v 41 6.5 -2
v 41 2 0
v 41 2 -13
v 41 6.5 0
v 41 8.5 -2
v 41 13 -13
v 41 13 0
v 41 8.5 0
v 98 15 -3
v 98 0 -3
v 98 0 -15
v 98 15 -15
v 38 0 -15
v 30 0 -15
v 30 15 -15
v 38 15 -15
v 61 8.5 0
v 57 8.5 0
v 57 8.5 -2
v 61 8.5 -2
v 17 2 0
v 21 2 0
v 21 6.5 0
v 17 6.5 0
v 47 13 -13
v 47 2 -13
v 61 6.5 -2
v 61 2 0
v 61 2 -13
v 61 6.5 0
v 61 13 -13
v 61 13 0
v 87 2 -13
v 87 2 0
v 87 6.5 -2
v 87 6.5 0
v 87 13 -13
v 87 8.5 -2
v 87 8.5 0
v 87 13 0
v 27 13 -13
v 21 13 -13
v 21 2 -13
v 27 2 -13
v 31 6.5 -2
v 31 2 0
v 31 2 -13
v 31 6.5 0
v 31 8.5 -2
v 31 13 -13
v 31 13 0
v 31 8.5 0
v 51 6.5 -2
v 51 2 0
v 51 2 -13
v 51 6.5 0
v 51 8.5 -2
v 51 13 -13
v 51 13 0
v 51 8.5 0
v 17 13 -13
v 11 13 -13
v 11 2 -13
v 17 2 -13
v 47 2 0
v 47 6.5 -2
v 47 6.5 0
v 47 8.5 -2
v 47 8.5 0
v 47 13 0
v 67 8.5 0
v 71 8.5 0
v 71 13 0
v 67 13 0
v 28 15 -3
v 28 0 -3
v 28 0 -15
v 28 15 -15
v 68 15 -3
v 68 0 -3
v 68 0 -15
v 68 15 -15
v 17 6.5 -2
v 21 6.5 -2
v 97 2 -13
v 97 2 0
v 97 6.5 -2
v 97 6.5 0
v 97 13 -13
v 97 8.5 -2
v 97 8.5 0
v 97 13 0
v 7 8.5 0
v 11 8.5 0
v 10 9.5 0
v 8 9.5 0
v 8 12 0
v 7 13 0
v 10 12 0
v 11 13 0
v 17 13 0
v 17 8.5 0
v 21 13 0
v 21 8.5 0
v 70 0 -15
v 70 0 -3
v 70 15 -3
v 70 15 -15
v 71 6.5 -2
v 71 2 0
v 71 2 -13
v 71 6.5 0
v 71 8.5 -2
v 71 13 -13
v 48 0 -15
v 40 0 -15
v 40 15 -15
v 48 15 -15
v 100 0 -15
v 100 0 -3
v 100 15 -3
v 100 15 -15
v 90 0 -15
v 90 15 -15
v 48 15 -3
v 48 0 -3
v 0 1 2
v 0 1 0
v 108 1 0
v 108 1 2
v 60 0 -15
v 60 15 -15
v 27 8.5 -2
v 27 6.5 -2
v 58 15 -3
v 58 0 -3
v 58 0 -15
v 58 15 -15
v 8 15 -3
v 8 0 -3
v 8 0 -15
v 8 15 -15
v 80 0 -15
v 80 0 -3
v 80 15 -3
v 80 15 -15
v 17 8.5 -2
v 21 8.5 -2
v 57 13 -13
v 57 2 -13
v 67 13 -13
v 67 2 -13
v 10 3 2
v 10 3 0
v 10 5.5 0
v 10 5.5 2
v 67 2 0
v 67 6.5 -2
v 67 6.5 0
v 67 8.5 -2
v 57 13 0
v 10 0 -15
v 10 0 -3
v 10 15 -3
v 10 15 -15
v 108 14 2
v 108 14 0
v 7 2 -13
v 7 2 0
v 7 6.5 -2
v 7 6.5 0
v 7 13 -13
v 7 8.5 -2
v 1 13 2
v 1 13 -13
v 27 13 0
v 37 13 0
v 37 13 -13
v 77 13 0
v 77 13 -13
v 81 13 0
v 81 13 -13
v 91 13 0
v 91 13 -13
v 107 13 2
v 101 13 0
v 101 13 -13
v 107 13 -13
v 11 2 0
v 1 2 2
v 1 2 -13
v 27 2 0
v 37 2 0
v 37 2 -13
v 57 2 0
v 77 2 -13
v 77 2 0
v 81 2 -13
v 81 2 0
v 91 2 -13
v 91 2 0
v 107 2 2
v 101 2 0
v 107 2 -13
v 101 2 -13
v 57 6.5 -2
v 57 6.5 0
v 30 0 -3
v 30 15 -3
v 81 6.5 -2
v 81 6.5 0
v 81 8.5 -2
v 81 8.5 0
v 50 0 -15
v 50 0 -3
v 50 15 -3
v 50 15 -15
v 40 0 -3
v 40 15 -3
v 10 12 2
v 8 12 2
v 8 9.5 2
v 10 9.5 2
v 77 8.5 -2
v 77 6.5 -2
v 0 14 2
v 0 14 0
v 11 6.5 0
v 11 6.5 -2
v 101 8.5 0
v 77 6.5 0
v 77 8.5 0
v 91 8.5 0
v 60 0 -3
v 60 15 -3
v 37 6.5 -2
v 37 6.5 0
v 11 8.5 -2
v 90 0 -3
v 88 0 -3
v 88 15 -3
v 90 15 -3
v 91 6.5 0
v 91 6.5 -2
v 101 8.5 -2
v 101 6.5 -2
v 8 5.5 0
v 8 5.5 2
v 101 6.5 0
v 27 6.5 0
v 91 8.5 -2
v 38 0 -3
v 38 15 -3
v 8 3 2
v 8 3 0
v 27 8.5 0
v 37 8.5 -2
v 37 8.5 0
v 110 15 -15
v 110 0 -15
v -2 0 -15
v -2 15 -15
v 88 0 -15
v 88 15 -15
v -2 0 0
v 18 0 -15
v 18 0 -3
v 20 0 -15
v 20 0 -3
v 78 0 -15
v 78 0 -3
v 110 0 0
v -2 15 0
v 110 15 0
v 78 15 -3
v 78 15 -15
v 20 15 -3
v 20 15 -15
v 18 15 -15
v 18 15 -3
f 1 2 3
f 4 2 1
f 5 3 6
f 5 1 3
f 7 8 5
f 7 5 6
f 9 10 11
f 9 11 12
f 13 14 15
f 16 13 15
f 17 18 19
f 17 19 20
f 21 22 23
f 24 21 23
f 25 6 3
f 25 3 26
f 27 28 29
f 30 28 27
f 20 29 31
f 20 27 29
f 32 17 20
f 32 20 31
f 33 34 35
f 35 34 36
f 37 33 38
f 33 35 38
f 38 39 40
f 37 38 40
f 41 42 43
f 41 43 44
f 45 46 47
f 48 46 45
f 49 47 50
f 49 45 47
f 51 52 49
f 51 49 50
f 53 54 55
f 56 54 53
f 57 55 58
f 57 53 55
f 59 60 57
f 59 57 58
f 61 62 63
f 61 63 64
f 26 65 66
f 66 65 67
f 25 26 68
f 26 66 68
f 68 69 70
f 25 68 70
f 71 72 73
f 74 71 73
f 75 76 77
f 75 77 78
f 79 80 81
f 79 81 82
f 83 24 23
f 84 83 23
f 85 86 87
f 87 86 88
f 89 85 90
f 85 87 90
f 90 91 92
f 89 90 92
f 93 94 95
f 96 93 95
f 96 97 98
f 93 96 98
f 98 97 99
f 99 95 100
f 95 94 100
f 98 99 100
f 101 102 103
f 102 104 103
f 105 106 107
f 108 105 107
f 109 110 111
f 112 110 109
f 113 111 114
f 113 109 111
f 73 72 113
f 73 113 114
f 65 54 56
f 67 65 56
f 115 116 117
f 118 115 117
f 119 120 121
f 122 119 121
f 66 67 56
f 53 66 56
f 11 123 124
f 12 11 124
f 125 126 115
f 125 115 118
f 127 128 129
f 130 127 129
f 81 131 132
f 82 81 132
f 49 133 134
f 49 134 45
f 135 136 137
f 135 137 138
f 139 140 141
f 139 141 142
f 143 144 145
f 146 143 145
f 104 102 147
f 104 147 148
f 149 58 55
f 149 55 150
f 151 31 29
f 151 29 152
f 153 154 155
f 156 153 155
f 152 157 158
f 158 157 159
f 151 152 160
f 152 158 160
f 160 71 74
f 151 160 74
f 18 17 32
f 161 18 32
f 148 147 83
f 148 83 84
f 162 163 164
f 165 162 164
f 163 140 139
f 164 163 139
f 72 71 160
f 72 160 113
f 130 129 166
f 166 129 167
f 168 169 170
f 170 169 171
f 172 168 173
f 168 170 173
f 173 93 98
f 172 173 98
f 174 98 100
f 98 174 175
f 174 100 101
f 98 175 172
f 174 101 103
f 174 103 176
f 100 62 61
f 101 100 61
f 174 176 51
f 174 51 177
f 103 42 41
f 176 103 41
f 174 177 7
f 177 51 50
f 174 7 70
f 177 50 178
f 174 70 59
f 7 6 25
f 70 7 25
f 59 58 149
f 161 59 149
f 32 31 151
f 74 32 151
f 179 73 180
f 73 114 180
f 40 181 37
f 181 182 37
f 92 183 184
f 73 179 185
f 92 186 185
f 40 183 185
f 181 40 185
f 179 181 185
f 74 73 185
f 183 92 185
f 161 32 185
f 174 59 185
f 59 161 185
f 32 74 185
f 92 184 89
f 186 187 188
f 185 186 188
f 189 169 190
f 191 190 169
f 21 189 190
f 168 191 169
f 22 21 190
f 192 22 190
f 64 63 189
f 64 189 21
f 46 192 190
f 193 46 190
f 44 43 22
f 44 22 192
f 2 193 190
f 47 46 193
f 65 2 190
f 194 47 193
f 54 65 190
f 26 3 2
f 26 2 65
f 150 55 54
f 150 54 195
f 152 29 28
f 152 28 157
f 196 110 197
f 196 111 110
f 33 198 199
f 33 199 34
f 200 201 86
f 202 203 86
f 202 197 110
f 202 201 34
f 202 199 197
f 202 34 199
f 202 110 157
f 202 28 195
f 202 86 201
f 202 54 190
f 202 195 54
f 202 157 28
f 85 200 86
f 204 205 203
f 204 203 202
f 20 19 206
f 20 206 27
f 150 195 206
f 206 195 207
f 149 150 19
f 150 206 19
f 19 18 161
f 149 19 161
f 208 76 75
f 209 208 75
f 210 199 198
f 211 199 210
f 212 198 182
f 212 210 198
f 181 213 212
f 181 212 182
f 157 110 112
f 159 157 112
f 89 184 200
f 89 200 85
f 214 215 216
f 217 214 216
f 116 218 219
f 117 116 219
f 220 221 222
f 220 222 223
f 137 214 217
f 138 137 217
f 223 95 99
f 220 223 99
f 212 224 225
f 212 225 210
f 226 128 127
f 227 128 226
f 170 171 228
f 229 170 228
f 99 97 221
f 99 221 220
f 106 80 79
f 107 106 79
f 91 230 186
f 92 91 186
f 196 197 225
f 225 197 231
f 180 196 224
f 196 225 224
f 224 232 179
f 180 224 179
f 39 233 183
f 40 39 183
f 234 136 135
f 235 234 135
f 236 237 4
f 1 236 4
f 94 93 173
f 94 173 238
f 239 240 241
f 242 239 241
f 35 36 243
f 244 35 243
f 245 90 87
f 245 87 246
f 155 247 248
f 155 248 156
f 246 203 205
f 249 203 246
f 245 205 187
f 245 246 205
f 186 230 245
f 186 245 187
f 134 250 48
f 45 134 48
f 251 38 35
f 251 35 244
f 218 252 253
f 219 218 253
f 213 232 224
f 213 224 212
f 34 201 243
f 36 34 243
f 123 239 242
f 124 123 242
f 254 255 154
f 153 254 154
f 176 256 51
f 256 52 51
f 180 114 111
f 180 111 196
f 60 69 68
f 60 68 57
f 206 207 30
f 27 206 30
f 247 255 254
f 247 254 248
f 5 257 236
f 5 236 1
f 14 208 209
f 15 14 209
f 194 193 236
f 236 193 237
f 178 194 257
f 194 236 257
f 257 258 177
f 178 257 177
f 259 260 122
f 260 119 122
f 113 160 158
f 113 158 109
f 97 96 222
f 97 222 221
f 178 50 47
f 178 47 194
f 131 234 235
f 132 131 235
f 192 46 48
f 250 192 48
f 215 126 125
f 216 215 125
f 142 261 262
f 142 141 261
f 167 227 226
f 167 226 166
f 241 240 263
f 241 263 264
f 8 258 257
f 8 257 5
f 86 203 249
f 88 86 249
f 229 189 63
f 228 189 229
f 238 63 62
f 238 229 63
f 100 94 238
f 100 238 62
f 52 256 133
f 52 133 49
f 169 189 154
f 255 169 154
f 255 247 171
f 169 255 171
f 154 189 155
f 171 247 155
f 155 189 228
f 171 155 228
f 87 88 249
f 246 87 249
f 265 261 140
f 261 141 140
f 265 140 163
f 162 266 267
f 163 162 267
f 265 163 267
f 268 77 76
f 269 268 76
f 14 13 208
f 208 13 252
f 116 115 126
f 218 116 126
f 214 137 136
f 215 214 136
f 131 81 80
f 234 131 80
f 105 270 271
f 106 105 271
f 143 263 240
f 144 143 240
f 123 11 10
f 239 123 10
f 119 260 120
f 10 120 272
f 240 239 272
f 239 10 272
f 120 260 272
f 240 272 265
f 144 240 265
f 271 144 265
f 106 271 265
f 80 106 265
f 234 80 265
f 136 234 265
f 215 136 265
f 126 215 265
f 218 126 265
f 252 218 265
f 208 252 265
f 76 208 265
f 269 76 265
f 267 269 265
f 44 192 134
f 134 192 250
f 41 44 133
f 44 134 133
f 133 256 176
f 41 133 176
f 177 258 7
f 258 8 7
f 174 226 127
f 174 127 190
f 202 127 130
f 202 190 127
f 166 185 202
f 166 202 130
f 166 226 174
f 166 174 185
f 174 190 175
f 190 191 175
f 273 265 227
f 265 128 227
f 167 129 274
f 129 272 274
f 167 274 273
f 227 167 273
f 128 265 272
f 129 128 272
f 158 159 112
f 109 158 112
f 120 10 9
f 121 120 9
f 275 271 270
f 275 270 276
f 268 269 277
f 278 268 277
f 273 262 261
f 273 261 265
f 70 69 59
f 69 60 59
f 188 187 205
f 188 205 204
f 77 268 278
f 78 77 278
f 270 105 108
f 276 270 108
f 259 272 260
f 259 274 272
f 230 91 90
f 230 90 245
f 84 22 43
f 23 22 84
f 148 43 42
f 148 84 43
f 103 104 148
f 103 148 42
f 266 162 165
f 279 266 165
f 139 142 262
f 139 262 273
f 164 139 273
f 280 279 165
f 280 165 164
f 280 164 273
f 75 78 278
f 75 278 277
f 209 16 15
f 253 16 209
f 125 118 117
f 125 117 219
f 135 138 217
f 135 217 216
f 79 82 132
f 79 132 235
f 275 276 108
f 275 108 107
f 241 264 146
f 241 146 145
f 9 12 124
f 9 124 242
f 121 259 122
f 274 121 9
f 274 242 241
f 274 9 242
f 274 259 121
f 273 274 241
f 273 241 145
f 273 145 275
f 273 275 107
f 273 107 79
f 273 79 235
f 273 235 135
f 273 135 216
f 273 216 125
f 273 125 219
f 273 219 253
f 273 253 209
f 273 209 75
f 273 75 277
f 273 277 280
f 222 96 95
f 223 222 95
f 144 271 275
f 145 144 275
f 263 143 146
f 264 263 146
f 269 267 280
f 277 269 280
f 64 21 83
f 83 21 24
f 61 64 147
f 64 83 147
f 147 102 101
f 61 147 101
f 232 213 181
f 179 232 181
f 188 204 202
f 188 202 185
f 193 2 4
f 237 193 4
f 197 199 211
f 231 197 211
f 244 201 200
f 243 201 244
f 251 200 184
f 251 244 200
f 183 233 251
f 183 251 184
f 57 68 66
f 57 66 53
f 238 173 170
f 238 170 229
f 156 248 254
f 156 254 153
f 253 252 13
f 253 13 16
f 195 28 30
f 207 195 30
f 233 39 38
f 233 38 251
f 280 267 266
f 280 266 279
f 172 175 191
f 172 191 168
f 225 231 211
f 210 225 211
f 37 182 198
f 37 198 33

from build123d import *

# Parameters (mm, degrees)
EXTRUDE_1_OUTLINE_W    = 15
EXTRUDE_1_OUTLINE_H    = 15
EXTRUDE_1_DEPTH        = 8
SKETCH_2_W             = 6
SKETCH_2_H             = 11
CUT_EXTRUDE_1_DEPTH    = 13
SKETCH_3_W             = 3
SKETCH_3_H             = 15
EXTRUDE_2_DEPTH        = 2
PATTERN_LINEAR_2_COUNT = 11
PATTERN_LINEAR_2_PITCH = 10
SKETCH_5_W             = 12
SKETCH_5_H             = 15
EXTRUDE_3_DEPTH        = 2
SKETCH_6_W             = 15
SKETCH_6_H             = 15
EXTRUDE_4_DEPTH        = 2
SKETCH_7_W             = 94
SKETCH_7_H             = 2
CUT_EXTRUDE_2_DEPTH    = 2
SKETCH_9_W             = 108
SKETCH_9_H             = 13
SKETCH_9_W_2           = 106
SKETCH_9_H_2           = 11
EXTRUDE_5_DEPTH        = 2
SKETCH_10_W            = 2
SKETCH_10_H            = 2.5
EXTRUDE_6_DEPTH        = 2


# Read off the part's stored shape, not the designer's step: 凸台-拉伸1
with BuildPart() as part:
    # 凸台-拉伸1 outline → 凸台-拉伸1 (new body)
    with BuildSketch(Plane.YZ):
        with Locations((7.5, -7.5)):
            Rectangle(EXTRUDE_1_OUTLINE_W, EXTRUDE_1_OUTLINE_H)
    extrude(amount=EXTRUDE_1_DEPTH)

    # 草图2 → 切除-拉伸1 (cut)
    with BuildSketch(Plane.XY):
        with Locations((4, 7.5)):
            Rectangle(SKETCH_2_W, SKETCH_2_H)
    extrude(amount=-CUT_EXTRUDE_1_DEPTH, mode=Mode.SUBTRACT)

    # 草图3 → 凸台-拉伸2 (add)
    with BuildSketch(Plane(origin=(8, 0, 0), x_dir=(0, 0, -1), z_dir=(1, 0, 0))):
        with Locations((1.5, 7.5)):
            Rectangle(SKETCH_3_W, SKETCH_3_H)
    extrude(amount=EXTRUDE_2_DEPTH)


with BuildPart() as pattern_linear_2_1:
    # 阵列(线性)2: pattern copy
    add(part.part.moved(Location(Vector(1, 0, 0) * (1 * PATTERN_LINEAR_2_PITCH))))


with BuildPart() as pattern_linear_2_2:
    # 阵列(线性)2: pattern copy
    add(part.part.moved(Location(Vector(1, 0, 0) * (2 * PATTERN_LINEAR_2_PITCH))))


with BuildPart() as pattern_linear_2_3:
    # 阵列(线性)2: pattern copy
    add(part.part.moved(Location(Vector(1, 0, 0) * (3 * PATTERN_LINEAR_2_PITCH))))


with BuildPart() as pattern_linear_2_4:
    # 阵列(线性)2: pattern copy
    add(part.part.moved(Location(Vector(1, 0, 0) * (4 * PATTERN_LINEAR_2_PITCH))))


with BuildPart() as pattern_linear_2_5:
    # 阵列(线性)2: pattern copy
    add(part.part.moved(Location(Vector(1, 0, 0) * (5 * PATTERN_LINEAR_2_PITCH))))


with BuildPart() as pattern_linear_2_6:
    # 阵列(线性)2: pattern copy
    add(part.part.moved(Location(Vector(1, 0, 0) * (6 * PATTERN_LINEAR_2_PITCH))))


with BuildPart() as pattern_linear_2_7:
    # 阵列(线性)2: pattern copy
    add(part.part.moved(Location(Vector(1, 0, 0) * (7 * PATTERN_LINEAR_2_PITCH))))


with BuildPart() as pattern_linear_2_8:
    # 阵列(线性)2: pattern copy
    add(part.part.moved(Location(Vector(1, 0, 0) * (8 * PATTERN_LINEAR_2_PITCH))))


with BuildPart() as pattern_linear_2_9:
    # 阵列(线性)2: pattern copy
    add(part.part.moved(Location(Vector(1, 0, 0) * (9 * PATTERN_LINEAR_2_PITCH))))


with BuildPart() as pattern_linear_2_10:
    # 阵列(线性)2: pattern copy
    add(part.part.moved(Location(Vector(1, 0, 0) * (10 * PATTERN_LINEAR_2_PITCH))))


with BuildPart() as part_1:
    add(part.part)

    # Combine 2: union 阵列(线性)2_1, 阵列(线性)2_2, 阵列(线性)2_3, 阵列(线性)2_4, 阵列(线性)2_5, 阵列(线性)2_6, 阵列(线性)2_7, 阵列(线性)2_8, 阵列(线性)2_9, 阵列(线性)2_10
    add(pattern_linear_2_1.part)
    add(pattern_linear_2_2.part)
    add(pattern_linear_2_3.part)
    add(pattern_linear_2_4.part)
    add(pattern_linear_2_5.part)
    add(pattern_linear_2_6.part)
    add(pattern_linear_2_7.part)
    add(pattern_linear_2_8.part)
    add(pattern_linear_2_9.part)
    add(pattern_linear_2_10.part)

    # 草图5 → 凸台-拉伸3 (add)
    with BuildSketch(Plane(origin=(108, 0, 0), x_dir=(0, 0, -1), z_dir=(1, 0, 0))):
        with Locations((9, 7.5)):
            Rectangle(SKETCH_5_W, SKETCH_5_H)
    extrude(amount=EXTRUDE_3_DEPTH)

    # 草图6 → 凸台-拉伸4 (add)
    with BuildSketch(Plane.ZY):
        with Locations((-7.5, 7.5)):
            Rectangle(SKETCH_6_W, SKETCH_6_H)
    extrude(amount=EXTRUDE_4_DEPTH)

    # 草图7 → 切除-拉伸2 (cut)
    with BuildSketch(Plane.XY):
        with Locations((54, 7.5)):
            Rectangle(SKETCH_7_W, SKETCH_7_H)
    extrude(amount=-CUT_EXTRUDE_2_DEPTH, mode=Mode.SUBTRACT)

    # 草图9 → 凸台-拉伸5 (add)
    with BuildSketch(Plane.XY):
        with Locations((54, 7.5)):
            Rectangle(SKETCH_9_W, SKETCH_9_H)
        with Locations((54, 7.5)):
            Rectangle(SKETCH_9_W_2, SKETCH_9_H_2, mode=Mode.SUBTRACT)
    extrude(amount=EXTRUDE_5_DEPTH)

    # 草图10 → 凸台-拉伸6 (add)
    with BuildSketch(Plane.XY):
        with Locations((9, 4.25)):
            Rectangle(SKETCH_10_W, SKETCH_10_H)
        with Locations((9, 10.75)):
            Rectangle(SKETCH_10_W, SKETCH_10_H)
    extrude(amount=EXTRUDE_6_DEPTH)


solid = part_1.part
